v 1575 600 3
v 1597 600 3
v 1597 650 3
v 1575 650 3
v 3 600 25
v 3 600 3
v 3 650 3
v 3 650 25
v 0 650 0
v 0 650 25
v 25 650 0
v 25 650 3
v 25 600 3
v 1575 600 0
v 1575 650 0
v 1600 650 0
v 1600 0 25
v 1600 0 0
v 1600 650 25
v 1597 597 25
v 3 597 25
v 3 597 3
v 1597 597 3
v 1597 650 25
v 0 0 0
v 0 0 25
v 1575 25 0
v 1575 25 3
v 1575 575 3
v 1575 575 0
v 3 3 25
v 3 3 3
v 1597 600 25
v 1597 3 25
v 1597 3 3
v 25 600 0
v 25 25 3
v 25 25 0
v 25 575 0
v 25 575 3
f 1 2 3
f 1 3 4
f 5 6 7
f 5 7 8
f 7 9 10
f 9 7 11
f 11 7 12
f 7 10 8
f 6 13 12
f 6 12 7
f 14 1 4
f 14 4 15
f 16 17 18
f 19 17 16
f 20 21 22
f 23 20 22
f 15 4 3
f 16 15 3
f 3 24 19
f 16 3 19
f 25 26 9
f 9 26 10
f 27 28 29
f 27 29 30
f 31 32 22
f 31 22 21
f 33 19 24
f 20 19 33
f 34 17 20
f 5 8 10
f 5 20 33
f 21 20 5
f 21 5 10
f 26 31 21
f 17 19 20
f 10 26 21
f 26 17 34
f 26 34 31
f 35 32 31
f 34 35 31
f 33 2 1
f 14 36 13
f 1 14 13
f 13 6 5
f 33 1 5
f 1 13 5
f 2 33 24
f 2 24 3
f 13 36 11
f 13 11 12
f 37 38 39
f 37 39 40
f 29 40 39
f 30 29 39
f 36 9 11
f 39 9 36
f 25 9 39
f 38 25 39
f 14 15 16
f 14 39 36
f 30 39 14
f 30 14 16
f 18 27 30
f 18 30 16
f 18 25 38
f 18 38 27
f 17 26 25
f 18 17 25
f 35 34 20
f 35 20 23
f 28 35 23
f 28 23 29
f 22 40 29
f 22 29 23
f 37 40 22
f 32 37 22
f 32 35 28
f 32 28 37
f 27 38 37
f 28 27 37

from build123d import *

# Parameters (mm, degrees)
F1_DEPTH = 1600
F3_DEPTH = 650
F5_DEPTH = 1600
F7_DEPTH = 650


with BuildPart() as f1:
    # F0 (on Right) → F1 (new body)
    with BuildSketch(Plane.YZ):
        Polygon((0, 25), (0, 0), (25, 0), (25, 3), (3, 3), (3, 25), align=None)
    extrude(amount=F1_DEPTH)

    # F2 (on Front) → F3 (join)
    with BuildSketch(Plane.XZ):
        Polygon((0, 25), (0, 0), (25, 0), (25, 3), (3, 3), (3, 25), align=None)
    extrude(amount=-F3_DEPTH)

    # F4 (on Right) → F5 (join)
    with BuildSketch(Plane.YZ):
        Polygon((600, 0), (600, 25), (597, 25), (597, 3), (575, 3), (575, 0), align=None)
    extrude(amount=F5_DEPTH)

    # F6 (on Front) → F7 (join)
    with BuildSketch(Plane.XZ):
        Polygon((1600, 0), (1600, 25), (1597, 25), (1597, 3), (1575, 3), (1575, 0), align=None)
    extrude(amount=-F7_DEPTH)


solid = f1.part
